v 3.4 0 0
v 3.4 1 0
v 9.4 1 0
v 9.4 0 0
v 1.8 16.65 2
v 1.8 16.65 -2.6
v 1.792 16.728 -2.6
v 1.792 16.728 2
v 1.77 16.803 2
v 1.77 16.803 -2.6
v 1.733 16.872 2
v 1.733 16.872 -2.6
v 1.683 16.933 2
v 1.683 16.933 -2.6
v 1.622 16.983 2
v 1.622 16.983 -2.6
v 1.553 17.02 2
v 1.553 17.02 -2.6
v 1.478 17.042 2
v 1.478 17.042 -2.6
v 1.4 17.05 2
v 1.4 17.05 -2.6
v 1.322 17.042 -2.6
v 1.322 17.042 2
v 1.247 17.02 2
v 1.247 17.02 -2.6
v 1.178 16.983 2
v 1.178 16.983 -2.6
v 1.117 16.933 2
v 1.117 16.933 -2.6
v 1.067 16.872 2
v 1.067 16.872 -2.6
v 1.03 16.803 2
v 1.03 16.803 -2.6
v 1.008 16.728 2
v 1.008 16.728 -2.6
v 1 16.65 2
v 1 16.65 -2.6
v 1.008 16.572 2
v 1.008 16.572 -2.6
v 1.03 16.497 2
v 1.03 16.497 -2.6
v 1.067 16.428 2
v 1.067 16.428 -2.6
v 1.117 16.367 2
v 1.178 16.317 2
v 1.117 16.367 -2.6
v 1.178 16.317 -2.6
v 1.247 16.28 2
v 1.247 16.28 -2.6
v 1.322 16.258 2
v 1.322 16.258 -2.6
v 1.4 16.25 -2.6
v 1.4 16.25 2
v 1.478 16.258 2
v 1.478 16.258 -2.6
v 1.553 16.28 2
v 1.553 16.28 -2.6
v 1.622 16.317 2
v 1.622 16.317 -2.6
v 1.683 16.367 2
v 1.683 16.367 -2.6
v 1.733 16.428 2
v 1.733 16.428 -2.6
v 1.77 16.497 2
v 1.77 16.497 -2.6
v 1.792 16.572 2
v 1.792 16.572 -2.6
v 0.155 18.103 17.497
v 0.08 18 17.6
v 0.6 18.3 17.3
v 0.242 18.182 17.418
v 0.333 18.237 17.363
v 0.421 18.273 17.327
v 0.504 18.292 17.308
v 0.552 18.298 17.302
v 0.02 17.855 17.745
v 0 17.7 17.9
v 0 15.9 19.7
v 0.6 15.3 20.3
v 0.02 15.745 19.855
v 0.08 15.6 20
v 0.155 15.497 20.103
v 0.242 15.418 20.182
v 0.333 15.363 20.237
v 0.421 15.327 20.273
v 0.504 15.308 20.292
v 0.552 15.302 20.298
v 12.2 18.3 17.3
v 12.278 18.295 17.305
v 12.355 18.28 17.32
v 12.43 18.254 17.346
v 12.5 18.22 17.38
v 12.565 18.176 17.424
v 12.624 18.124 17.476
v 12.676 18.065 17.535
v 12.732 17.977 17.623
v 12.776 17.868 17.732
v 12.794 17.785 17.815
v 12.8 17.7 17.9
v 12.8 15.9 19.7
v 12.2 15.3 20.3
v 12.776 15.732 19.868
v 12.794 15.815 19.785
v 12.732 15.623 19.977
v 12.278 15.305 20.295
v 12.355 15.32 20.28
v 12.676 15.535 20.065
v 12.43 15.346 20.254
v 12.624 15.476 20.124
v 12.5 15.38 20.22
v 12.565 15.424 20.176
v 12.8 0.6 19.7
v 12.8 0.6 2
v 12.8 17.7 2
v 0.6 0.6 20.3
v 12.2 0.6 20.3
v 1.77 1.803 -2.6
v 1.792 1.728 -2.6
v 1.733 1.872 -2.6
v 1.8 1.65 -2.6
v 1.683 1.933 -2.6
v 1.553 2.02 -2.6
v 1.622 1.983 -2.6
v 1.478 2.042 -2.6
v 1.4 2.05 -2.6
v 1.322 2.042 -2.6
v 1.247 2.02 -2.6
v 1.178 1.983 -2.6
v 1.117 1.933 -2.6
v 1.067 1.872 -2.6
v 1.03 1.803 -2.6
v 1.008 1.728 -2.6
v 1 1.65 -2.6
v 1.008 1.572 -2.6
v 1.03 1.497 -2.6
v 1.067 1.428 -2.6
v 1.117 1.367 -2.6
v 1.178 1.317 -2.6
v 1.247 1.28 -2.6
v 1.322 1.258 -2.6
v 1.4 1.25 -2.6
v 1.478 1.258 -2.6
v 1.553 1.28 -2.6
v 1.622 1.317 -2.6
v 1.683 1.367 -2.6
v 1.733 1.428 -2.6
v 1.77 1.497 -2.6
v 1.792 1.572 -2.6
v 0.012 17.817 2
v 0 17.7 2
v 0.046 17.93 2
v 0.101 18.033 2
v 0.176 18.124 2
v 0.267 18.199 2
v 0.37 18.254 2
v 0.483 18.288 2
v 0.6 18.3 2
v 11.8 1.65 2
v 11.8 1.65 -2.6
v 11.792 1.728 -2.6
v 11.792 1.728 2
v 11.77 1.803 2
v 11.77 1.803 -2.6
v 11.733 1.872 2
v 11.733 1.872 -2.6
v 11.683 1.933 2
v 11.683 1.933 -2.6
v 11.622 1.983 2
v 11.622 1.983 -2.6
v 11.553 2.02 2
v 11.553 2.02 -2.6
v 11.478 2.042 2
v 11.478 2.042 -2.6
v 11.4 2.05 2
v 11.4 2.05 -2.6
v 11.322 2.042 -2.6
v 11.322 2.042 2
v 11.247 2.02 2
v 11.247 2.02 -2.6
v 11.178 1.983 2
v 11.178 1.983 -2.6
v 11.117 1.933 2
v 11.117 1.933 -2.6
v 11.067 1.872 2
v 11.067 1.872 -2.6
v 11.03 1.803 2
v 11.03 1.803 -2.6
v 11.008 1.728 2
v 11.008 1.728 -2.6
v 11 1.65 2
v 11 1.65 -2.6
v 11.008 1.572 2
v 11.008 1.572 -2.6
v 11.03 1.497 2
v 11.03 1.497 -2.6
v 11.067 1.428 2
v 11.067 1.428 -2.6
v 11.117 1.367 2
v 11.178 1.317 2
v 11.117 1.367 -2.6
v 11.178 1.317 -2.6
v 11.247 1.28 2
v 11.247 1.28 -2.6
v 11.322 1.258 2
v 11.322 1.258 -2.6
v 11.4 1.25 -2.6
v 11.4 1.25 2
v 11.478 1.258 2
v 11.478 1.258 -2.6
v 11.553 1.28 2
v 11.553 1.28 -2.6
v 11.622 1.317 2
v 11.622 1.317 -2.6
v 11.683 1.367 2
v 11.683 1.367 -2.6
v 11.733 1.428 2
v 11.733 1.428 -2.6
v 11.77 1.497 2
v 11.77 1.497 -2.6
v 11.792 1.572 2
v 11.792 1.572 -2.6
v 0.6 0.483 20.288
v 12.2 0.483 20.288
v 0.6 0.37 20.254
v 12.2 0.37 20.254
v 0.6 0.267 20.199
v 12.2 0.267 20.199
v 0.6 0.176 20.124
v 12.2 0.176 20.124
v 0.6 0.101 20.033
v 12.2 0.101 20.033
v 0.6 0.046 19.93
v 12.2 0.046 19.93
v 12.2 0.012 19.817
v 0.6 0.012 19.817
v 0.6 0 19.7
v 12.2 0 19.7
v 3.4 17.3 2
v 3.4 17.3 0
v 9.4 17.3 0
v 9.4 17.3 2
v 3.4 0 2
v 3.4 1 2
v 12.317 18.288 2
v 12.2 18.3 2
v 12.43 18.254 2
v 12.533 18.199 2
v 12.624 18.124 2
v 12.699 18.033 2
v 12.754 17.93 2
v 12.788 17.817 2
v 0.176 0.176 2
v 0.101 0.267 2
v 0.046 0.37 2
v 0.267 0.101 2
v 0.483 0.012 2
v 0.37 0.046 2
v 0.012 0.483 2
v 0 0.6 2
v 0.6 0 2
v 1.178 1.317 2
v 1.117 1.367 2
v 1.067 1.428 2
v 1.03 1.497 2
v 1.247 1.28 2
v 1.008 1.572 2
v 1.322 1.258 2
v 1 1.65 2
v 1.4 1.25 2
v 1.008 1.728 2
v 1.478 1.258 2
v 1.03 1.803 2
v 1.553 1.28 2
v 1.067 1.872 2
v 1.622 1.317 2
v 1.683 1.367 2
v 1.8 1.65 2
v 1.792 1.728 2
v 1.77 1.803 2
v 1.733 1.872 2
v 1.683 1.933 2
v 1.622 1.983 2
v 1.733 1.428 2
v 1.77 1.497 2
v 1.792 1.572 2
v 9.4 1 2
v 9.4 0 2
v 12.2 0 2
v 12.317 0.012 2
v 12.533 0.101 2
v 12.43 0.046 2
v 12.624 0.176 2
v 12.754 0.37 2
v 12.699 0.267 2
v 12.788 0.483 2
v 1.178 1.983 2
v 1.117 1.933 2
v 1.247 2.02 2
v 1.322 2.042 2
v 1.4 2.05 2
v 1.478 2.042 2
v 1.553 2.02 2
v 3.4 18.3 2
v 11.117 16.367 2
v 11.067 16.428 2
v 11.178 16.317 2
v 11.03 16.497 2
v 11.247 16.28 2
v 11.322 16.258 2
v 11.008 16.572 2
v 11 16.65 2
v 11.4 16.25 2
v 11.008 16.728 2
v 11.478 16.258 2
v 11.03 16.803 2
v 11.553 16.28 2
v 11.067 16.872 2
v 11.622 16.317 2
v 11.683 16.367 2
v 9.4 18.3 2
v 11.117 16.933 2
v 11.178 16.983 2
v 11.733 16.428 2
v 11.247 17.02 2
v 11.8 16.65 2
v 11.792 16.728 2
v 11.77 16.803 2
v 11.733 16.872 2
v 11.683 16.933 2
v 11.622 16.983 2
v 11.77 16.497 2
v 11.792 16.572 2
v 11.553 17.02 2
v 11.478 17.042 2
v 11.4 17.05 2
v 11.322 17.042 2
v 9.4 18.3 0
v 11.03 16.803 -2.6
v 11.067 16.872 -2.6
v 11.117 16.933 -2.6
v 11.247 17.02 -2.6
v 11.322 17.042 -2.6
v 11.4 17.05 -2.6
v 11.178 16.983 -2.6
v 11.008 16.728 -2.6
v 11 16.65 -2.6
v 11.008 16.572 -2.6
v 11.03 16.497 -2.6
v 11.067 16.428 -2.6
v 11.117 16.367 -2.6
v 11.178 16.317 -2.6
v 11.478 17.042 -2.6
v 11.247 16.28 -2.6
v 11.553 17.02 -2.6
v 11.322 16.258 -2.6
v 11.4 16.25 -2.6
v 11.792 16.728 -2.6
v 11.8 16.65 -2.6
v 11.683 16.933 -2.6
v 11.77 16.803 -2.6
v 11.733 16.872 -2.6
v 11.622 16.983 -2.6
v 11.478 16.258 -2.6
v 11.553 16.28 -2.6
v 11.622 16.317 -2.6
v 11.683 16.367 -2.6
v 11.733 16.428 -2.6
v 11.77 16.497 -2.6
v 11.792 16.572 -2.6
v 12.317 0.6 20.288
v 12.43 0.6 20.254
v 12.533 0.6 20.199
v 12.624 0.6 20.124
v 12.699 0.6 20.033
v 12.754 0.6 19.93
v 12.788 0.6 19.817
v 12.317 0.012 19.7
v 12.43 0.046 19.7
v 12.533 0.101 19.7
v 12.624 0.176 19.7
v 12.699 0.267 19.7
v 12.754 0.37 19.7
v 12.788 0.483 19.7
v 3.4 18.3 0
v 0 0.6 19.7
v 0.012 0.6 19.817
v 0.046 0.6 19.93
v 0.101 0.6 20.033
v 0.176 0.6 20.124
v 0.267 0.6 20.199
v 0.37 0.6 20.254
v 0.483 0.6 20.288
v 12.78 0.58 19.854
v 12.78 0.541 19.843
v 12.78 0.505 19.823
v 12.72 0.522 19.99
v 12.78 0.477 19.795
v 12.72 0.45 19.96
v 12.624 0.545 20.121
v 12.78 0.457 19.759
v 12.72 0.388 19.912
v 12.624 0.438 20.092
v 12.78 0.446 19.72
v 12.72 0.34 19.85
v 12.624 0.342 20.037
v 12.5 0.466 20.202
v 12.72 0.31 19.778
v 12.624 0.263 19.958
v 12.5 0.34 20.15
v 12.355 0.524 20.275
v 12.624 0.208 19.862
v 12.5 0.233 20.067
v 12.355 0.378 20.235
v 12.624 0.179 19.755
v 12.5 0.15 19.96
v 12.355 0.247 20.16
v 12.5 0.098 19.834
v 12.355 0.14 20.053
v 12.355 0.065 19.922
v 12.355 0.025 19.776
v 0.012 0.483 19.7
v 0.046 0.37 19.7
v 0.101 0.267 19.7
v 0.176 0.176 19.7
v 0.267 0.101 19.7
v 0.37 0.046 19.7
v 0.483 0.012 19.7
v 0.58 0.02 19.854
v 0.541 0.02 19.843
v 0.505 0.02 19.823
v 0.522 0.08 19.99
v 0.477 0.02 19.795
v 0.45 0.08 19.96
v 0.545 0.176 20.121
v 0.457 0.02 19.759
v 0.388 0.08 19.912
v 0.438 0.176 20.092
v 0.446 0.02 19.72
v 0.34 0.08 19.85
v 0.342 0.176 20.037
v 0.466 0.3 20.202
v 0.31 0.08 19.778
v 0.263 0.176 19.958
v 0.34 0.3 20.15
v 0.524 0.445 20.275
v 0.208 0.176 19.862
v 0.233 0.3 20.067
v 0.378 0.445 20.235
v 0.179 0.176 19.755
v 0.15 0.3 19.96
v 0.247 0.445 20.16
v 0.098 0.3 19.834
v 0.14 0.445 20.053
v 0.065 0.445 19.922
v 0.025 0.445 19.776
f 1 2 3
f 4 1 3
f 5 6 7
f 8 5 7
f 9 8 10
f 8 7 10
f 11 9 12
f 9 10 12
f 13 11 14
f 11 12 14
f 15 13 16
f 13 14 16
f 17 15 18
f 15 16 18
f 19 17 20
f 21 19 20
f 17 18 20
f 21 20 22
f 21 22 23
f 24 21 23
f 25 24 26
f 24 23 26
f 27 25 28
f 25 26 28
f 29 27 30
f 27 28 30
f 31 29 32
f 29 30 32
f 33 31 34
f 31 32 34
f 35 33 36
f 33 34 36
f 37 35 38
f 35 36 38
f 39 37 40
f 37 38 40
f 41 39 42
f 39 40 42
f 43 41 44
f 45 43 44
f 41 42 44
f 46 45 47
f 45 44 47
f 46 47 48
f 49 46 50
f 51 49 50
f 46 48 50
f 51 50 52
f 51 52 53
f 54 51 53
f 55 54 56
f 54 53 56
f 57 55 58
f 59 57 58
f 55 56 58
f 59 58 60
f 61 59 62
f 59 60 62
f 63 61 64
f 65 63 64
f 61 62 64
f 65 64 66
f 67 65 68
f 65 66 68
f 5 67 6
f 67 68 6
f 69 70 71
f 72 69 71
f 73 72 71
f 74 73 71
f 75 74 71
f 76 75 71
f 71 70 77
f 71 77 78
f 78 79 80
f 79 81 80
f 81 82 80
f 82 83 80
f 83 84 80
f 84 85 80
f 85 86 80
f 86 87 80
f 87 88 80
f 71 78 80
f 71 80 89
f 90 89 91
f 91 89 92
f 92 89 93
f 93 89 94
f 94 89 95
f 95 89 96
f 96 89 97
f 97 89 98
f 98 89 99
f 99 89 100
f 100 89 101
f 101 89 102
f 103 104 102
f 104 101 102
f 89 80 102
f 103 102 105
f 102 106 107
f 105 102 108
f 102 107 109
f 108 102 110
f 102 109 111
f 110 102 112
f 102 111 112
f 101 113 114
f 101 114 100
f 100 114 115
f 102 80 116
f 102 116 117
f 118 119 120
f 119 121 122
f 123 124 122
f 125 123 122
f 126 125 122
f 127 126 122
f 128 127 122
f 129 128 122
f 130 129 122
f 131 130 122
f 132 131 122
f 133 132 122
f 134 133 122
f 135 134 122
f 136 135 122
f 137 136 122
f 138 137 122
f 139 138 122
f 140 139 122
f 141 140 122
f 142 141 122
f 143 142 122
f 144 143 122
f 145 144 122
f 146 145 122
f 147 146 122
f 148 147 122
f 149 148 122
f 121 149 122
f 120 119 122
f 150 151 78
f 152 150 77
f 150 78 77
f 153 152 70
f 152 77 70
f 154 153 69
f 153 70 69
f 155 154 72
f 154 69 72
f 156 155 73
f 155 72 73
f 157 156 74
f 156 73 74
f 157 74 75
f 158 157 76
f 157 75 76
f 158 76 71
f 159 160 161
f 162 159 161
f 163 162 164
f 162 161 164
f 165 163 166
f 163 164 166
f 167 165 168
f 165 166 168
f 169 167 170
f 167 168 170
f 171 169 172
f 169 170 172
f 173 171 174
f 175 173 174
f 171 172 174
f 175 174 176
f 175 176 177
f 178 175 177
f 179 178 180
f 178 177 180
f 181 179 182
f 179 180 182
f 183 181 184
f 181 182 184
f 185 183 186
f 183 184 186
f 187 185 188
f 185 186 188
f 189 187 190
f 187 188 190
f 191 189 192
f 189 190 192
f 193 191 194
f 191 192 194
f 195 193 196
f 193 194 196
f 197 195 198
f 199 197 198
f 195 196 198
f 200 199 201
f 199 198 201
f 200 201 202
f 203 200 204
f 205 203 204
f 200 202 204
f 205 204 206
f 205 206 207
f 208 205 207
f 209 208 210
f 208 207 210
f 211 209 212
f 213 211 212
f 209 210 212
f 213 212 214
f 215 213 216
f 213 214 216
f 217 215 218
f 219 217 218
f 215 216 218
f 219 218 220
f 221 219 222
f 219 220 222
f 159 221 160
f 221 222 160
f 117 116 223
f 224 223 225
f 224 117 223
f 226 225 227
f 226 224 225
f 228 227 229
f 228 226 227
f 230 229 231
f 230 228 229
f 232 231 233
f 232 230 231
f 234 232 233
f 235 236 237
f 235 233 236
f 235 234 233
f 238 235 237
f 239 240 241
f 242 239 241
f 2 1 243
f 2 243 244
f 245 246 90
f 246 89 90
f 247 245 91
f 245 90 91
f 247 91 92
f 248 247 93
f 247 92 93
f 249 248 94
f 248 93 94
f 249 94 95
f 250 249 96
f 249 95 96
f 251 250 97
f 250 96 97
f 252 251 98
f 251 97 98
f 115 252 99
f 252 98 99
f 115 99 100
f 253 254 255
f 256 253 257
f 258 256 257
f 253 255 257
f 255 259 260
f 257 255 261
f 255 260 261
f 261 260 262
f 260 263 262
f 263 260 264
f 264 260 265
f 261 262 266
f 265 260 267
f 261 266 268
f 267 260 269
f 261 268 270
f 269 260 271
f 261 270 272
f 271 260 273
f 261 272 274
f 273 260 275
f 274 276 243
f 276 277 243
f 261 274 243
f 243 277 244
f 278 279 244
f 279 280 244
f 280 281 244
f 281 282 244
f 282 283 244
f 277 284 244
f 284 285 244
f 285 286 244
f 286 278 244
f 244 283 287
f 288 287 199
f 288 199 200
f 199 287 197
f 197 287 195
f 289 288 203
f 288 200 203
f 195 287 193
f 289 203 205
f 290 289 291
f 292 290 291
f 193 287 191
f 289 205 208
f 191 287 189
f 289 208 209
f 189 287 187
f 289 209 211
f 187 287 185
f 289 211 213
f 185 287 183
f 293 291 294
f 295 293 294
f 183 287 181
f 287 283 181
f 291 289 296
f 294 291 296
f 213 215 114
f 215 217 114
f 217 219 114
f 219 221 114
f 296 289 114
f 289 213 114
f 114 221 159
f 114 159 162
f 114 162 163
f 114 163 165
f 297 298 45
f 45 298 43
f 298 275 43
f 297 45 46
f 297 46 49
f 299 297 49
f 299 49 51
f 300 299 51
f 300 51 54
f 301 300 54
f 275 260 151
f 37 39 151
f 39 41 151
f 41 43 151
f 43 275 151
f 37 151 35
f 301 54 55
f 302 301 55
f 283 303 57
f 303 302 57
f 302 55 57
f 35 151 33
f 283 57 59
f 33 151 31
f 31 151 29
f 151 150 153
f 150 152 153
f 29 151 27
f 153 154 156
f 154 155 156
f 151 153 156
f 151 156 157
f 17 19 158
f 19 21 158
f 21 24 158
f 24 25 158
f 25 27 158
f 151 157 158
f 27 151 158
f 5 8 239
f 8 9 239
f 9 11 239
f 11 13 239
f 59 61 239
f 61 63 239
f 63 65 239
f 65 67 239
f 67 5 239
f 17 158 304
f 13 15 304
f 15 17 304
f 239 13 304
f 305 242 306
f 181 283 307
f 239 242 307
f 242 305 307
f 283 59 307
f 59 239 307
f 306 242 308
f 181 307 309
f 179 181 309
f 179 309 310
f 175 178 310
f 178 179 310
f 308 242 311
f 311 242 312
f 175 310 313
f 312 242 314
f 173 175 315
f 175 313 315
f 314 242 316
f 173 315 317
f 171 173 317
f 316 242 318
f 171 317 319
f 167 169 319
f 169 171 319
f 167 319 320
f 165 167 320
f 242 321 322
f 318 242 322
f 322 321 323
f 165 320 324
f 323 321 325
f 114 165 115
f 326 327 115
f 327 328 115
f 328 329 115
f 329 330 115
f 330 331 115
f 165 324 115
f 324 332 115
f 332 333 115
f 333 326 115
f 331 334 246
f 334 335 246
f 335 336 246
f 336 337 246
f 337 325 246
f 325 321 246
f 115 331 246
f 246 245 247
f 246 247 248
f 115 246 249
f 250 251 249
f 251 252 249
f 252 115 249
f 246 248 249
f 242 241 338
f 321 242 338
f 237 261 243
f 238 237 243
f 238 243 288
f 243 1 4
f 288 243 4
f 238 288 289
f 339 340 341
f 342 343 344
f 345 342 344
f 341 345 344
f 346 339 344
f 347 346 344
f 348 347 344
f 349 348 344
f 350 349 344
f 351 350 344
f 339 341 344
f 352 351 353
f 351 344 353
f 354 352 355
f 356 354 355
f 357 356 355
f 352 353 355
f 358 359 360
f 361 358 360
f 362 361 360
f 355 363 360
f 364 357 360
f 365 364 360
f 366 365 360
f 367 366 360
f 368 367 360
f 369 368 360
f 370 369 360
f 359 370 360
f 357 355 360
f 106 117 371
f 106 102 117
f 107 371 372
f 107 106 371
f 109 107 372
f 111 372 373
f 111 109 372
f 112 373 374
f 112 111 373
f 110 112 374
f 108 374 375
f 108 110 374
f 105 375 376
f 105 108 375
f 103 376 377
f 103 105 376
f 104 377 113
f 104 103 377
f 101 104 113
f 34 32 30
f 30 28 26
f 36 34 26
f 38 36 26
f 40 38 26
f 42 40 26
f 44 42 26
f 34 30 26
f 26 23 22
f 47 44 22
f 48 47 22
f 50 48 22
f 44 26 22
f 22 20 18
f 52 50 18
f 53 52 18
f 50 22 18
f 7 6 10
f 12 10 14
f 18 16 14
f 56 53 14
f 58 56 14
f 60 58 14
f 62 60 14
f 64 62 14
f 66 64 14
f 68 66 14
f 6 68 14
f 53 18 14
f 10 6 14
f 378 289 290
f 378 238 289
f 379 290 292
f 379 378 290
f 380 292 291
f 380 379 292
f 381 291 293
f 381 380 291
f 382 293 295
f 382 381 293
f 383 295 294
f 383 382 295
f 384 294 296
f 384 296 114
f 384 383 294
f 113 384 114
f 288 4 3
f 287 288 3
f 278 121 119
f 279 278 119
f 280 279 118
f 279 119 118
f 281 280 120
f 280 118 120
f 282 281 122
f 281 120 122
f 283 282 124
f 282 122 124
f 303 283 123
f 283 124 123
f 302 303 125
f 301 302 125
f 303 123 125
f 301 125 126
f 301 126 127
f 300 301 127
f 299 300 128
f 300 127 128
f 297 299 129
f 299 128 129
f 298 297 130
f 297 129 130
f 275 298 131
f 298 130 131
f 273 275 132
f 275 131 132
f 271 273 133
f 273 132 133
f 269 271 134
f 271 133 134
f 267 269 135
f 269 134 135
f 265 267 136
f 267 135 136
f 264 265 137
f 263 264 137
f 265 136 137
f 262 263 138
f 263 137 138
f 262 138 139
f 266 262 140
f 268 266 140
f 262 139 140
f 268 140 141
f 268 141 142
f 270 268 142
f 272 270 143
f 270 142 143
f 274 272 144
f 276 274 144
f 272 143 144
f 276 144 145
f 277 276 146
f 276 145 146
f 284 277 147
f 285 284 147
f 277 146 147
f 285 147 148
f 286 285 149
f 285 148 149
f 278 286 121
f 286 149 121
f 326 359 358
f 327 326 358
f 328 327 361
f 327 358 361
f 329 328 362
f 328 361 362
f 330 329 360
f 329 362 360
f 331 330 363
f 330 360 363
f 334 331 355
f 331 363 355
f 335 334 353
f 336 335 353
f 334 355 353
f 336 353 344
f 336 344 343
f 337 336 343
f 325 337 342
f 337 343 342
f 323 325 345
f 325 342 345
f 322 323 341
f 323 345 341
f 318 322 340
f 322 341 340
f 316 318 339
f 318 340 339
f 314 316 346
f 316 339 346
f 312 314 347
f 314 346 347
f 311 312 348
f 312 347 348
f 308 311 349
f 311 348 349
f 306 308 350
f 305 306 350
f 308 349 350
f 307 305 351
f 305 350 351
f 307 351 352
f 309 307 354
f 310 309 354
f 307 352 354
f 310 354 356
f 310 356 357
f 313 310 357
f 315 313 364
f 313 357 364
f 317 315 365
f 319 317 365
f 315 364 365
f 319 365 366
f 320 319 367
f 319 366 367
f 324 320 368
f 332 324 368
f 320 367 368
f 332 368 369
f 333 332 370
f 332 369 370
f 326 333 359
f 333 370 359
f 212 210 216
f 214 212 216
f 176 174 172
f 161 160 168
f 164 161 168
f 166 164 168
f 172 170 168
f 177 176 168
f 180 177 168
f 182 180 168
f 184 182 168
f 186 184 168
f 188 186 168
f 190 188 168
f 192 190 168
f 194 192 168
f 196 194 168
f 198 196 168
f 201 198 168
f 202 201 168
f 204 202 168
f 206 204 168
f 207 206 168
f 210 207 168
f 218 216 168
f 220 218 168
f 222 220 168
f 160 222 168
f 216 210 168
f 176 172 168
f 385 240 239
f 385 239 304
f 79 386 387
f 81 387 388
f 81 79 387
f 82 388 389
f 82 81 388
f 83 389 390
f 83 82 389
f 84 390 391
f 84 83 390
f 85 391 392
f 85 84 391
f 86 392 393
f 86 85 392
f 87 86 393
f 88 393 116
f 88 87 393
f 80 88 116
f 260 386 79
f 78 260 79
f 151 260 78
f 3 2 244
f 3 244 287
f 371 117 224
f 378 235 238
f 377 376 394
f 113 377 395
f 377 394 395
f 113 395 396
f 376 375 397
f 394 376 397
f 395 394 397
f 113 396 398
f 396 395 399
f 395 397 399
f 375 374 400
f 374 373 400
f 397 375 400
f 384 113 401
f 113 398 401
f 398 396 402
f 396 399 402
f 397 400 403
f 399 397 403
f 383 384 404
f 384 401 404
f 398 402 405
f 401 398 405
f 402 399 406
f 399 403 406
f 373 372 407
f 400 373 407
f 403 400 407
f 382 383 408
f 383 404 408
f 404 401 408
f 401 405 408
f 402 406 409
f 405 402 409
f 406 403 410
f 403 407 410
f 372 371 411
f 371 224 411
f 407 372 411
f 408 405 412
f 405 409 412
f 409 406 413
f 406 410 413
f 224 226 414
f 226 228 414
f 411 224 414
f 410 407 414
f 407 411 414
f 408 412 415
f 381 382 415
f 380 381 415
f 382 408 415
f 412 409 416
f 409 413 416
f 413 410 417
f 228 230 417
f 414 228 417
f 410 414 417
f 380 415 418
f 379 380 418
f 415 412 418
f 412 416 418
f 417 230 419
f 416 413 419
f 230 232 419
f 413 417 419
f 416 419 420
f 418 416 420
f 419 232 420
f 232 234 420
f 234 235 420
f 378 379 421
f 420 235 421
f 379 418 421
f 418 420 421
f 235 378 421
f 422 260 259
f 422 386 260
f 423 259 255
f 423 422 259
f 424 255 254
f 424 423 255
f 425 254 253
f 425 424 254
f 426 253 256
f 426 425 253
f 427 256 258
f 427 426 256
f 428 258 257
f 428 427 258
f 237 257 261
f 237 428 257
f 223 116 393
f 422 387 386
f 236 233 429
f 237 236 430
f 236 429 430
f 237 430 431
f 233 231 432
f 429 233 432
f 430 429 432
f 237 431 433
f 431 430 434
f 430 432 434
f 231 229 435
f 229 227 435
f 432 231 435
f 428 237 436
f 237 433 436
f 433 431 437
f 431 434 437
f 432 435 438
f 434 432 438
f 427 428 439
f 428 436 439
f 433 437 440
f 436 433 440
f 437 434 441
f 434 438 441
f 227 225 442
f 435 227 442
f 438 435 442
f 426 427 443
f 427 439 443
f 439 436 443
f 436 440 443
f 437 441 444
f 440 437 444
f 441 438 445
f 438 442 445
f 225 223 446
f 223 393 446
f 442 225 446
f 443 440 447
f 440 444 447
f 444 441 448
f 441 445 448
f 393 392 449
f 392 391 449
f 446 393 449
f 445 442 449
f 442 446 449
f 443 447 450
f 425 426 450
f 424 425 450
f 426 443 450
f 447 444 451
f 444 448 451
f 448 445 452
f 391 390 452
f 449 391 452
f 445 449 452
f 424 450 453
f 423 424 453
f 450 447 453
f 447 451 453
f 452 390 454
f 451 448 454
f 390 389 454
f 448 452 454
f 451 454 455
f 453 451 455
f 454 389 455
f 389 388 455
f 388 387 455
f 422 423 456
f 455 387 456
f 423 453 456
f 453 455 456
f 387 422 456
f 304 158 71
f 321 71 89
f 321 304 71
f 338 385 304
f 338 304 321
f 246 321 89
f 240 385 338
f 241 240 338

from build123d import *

# Parameters (mm, degrees)
CYLINDER_R        = 0.4
CYLINDER_DEPTH    = 4.6
CYLINDER001_R     = 0.4
CYLINDER001_DEPTH = 4.6
CYLINDER002_R     = 0.4
CYLINDER002_DEPTH = 4.6
CYLINDER003_R     = 0.4
CYLINDER003_DEPTH = 4.6
BOX003_W          = 12.8
BOX003_H          = 16.299999
BOX003_DEPTH      = 2
BOX002_W          = 3.4
BOX002_H          = 18.299999
BOX002_DEPTH      = 2
BOX001_W          = 3.4
BOX001_H          = 18.299999
BOX001_DEPTH      = 2
BOX_W             = 12.8
BOX_H             = 18.299999
BOX_DEPTH         = 20.299999
CHAMFER_SIZE      = 3
FILLET_R          = 0.6


with BuildPart() as pin4:
    # Cylinder → Cylinder (new body)
    with BuildSketch(Plane(origin=(1.4, 1.65, -2.6), x_dir=(1, 0, 0), z_dir=(0, 0, 1))):
        Circle(CYLINDER_R)
    extrude(amount=CYLINDER_DEPTH)


with BuildPart() as pin3:
    # Cylinder001 → Cylinder001 (new body)
    with BuildSketch(Plane(origin=(11.4, 1.65, -2.6), x_dir=(1, 0, 0), z_dir=(0, 0, 1))):
        Circle(CYLINDER001_R)
    extrude(amount=CYLINDER001_DEPTH)


with BuildPart() as pin2:
    # Cylinder002 → Cylinder002 (new body)
    with BuildSketch(Plane(origin=(11.4, 16.65, -2.6), x_dir=(1, 0, 0), z_dir=(0, 0, 1))):
        Circle(CYLINDER002_R)
    extrude(amount=CYLINDER002_DEPTH)


with BuildPart() as pin1:
    # Cylinder003 → Cylinder003 (new body)
    with BuildSketch(Plane(origin=(1.4, 16.65, -2.6), x_dir=(1, 0, 0), z_dir=(0, 0, 1))):
        Circle(CYLINDER003_R)
    extrude(amount=CYLINDER003_DEPTH)


with BuildPart() as box003:
    # Box003 → Box003 (new body)
    with BuildSketch(Plane(origin=(0, 1, 0), x_dir=(1, 0, 0), z_dir=(0, 0, 1))):
        with Locations((6.4, 8.149999)):
            Rectangle(BOX003_W, BOX003_H)
    extrude(amount=BOX003_DEPTH)


with BuildPart() as right_cutout:
    # Box002 → Box002 (new body)
    with BuildSketch(Plane(origin=(9.4, 0, 0), x_dir=(1, 0, 0), z_dir=(0, 0, 1))):
        with Locations((1.7, 9.149999)):
            Rectangle(BOX002_W, BOX002_H)
    extrude(amount=BOX002_DEPTH)


with BuildPart() as left_cutout:
    # Box001 → Box001 (new body)
    with BuildSketch(Plane.XY):
        with Locations((1.7, 9.149999)):
            Rectangle(BOX001_W, BOX001_H)
    extrude(amount=BOX001_DEPTH)


with BuildPart() as rn212:
    # Box → Box (new body)
    with BuildSketch(Plane.XY):
        with Locations((6.4, 9.149999)):
            Rectangle(BOX_W, BOX_H)
    extrude(amount=BOX_DEPTH)

    # Cut: cut left_cutout
    add(left_cutout.part, mode=Mode.SUBTRACT)

    # Cut001: cut right_cutout
    add(right_cutout.part, mode=Mode.SUBTRACT)

    # Cut002: cut Box003
    add(box003.part, mode=Mode.SUBTRACT)

    # Chamfer
    chamfer_edges = [rn212.edges().sort_by_distance(p)[0] for p in [
        (6.4, 18.299999, 20.299999),
    ]]
    chamfer(chamfer_edges, length=CHAMFER_SIZE)

    # Fillet
    fillet_edges = [rn212.edges().sort_by_distance(p)[0] for p in [
        (0, 7.65, 20.299999),
        (6.4, 0, 20.299999),
        (12.8, 7.65, 20.299999),
        (0, 0, 11.15),
        (0, 18.299999, 9.65),
        (12.8, 0, 11.15),
        (12.8, 18.299999, 9.65),
    ]]
    fillet(fillet_edges, radius=FILLET_R)

    # Fusion: union Pin4, Pin3, Pin2, Pin1
    add(pin4.part)
    add(pin3.part)
    add(pin2.part)
    add(pin1.part)


solid = rn212.part
